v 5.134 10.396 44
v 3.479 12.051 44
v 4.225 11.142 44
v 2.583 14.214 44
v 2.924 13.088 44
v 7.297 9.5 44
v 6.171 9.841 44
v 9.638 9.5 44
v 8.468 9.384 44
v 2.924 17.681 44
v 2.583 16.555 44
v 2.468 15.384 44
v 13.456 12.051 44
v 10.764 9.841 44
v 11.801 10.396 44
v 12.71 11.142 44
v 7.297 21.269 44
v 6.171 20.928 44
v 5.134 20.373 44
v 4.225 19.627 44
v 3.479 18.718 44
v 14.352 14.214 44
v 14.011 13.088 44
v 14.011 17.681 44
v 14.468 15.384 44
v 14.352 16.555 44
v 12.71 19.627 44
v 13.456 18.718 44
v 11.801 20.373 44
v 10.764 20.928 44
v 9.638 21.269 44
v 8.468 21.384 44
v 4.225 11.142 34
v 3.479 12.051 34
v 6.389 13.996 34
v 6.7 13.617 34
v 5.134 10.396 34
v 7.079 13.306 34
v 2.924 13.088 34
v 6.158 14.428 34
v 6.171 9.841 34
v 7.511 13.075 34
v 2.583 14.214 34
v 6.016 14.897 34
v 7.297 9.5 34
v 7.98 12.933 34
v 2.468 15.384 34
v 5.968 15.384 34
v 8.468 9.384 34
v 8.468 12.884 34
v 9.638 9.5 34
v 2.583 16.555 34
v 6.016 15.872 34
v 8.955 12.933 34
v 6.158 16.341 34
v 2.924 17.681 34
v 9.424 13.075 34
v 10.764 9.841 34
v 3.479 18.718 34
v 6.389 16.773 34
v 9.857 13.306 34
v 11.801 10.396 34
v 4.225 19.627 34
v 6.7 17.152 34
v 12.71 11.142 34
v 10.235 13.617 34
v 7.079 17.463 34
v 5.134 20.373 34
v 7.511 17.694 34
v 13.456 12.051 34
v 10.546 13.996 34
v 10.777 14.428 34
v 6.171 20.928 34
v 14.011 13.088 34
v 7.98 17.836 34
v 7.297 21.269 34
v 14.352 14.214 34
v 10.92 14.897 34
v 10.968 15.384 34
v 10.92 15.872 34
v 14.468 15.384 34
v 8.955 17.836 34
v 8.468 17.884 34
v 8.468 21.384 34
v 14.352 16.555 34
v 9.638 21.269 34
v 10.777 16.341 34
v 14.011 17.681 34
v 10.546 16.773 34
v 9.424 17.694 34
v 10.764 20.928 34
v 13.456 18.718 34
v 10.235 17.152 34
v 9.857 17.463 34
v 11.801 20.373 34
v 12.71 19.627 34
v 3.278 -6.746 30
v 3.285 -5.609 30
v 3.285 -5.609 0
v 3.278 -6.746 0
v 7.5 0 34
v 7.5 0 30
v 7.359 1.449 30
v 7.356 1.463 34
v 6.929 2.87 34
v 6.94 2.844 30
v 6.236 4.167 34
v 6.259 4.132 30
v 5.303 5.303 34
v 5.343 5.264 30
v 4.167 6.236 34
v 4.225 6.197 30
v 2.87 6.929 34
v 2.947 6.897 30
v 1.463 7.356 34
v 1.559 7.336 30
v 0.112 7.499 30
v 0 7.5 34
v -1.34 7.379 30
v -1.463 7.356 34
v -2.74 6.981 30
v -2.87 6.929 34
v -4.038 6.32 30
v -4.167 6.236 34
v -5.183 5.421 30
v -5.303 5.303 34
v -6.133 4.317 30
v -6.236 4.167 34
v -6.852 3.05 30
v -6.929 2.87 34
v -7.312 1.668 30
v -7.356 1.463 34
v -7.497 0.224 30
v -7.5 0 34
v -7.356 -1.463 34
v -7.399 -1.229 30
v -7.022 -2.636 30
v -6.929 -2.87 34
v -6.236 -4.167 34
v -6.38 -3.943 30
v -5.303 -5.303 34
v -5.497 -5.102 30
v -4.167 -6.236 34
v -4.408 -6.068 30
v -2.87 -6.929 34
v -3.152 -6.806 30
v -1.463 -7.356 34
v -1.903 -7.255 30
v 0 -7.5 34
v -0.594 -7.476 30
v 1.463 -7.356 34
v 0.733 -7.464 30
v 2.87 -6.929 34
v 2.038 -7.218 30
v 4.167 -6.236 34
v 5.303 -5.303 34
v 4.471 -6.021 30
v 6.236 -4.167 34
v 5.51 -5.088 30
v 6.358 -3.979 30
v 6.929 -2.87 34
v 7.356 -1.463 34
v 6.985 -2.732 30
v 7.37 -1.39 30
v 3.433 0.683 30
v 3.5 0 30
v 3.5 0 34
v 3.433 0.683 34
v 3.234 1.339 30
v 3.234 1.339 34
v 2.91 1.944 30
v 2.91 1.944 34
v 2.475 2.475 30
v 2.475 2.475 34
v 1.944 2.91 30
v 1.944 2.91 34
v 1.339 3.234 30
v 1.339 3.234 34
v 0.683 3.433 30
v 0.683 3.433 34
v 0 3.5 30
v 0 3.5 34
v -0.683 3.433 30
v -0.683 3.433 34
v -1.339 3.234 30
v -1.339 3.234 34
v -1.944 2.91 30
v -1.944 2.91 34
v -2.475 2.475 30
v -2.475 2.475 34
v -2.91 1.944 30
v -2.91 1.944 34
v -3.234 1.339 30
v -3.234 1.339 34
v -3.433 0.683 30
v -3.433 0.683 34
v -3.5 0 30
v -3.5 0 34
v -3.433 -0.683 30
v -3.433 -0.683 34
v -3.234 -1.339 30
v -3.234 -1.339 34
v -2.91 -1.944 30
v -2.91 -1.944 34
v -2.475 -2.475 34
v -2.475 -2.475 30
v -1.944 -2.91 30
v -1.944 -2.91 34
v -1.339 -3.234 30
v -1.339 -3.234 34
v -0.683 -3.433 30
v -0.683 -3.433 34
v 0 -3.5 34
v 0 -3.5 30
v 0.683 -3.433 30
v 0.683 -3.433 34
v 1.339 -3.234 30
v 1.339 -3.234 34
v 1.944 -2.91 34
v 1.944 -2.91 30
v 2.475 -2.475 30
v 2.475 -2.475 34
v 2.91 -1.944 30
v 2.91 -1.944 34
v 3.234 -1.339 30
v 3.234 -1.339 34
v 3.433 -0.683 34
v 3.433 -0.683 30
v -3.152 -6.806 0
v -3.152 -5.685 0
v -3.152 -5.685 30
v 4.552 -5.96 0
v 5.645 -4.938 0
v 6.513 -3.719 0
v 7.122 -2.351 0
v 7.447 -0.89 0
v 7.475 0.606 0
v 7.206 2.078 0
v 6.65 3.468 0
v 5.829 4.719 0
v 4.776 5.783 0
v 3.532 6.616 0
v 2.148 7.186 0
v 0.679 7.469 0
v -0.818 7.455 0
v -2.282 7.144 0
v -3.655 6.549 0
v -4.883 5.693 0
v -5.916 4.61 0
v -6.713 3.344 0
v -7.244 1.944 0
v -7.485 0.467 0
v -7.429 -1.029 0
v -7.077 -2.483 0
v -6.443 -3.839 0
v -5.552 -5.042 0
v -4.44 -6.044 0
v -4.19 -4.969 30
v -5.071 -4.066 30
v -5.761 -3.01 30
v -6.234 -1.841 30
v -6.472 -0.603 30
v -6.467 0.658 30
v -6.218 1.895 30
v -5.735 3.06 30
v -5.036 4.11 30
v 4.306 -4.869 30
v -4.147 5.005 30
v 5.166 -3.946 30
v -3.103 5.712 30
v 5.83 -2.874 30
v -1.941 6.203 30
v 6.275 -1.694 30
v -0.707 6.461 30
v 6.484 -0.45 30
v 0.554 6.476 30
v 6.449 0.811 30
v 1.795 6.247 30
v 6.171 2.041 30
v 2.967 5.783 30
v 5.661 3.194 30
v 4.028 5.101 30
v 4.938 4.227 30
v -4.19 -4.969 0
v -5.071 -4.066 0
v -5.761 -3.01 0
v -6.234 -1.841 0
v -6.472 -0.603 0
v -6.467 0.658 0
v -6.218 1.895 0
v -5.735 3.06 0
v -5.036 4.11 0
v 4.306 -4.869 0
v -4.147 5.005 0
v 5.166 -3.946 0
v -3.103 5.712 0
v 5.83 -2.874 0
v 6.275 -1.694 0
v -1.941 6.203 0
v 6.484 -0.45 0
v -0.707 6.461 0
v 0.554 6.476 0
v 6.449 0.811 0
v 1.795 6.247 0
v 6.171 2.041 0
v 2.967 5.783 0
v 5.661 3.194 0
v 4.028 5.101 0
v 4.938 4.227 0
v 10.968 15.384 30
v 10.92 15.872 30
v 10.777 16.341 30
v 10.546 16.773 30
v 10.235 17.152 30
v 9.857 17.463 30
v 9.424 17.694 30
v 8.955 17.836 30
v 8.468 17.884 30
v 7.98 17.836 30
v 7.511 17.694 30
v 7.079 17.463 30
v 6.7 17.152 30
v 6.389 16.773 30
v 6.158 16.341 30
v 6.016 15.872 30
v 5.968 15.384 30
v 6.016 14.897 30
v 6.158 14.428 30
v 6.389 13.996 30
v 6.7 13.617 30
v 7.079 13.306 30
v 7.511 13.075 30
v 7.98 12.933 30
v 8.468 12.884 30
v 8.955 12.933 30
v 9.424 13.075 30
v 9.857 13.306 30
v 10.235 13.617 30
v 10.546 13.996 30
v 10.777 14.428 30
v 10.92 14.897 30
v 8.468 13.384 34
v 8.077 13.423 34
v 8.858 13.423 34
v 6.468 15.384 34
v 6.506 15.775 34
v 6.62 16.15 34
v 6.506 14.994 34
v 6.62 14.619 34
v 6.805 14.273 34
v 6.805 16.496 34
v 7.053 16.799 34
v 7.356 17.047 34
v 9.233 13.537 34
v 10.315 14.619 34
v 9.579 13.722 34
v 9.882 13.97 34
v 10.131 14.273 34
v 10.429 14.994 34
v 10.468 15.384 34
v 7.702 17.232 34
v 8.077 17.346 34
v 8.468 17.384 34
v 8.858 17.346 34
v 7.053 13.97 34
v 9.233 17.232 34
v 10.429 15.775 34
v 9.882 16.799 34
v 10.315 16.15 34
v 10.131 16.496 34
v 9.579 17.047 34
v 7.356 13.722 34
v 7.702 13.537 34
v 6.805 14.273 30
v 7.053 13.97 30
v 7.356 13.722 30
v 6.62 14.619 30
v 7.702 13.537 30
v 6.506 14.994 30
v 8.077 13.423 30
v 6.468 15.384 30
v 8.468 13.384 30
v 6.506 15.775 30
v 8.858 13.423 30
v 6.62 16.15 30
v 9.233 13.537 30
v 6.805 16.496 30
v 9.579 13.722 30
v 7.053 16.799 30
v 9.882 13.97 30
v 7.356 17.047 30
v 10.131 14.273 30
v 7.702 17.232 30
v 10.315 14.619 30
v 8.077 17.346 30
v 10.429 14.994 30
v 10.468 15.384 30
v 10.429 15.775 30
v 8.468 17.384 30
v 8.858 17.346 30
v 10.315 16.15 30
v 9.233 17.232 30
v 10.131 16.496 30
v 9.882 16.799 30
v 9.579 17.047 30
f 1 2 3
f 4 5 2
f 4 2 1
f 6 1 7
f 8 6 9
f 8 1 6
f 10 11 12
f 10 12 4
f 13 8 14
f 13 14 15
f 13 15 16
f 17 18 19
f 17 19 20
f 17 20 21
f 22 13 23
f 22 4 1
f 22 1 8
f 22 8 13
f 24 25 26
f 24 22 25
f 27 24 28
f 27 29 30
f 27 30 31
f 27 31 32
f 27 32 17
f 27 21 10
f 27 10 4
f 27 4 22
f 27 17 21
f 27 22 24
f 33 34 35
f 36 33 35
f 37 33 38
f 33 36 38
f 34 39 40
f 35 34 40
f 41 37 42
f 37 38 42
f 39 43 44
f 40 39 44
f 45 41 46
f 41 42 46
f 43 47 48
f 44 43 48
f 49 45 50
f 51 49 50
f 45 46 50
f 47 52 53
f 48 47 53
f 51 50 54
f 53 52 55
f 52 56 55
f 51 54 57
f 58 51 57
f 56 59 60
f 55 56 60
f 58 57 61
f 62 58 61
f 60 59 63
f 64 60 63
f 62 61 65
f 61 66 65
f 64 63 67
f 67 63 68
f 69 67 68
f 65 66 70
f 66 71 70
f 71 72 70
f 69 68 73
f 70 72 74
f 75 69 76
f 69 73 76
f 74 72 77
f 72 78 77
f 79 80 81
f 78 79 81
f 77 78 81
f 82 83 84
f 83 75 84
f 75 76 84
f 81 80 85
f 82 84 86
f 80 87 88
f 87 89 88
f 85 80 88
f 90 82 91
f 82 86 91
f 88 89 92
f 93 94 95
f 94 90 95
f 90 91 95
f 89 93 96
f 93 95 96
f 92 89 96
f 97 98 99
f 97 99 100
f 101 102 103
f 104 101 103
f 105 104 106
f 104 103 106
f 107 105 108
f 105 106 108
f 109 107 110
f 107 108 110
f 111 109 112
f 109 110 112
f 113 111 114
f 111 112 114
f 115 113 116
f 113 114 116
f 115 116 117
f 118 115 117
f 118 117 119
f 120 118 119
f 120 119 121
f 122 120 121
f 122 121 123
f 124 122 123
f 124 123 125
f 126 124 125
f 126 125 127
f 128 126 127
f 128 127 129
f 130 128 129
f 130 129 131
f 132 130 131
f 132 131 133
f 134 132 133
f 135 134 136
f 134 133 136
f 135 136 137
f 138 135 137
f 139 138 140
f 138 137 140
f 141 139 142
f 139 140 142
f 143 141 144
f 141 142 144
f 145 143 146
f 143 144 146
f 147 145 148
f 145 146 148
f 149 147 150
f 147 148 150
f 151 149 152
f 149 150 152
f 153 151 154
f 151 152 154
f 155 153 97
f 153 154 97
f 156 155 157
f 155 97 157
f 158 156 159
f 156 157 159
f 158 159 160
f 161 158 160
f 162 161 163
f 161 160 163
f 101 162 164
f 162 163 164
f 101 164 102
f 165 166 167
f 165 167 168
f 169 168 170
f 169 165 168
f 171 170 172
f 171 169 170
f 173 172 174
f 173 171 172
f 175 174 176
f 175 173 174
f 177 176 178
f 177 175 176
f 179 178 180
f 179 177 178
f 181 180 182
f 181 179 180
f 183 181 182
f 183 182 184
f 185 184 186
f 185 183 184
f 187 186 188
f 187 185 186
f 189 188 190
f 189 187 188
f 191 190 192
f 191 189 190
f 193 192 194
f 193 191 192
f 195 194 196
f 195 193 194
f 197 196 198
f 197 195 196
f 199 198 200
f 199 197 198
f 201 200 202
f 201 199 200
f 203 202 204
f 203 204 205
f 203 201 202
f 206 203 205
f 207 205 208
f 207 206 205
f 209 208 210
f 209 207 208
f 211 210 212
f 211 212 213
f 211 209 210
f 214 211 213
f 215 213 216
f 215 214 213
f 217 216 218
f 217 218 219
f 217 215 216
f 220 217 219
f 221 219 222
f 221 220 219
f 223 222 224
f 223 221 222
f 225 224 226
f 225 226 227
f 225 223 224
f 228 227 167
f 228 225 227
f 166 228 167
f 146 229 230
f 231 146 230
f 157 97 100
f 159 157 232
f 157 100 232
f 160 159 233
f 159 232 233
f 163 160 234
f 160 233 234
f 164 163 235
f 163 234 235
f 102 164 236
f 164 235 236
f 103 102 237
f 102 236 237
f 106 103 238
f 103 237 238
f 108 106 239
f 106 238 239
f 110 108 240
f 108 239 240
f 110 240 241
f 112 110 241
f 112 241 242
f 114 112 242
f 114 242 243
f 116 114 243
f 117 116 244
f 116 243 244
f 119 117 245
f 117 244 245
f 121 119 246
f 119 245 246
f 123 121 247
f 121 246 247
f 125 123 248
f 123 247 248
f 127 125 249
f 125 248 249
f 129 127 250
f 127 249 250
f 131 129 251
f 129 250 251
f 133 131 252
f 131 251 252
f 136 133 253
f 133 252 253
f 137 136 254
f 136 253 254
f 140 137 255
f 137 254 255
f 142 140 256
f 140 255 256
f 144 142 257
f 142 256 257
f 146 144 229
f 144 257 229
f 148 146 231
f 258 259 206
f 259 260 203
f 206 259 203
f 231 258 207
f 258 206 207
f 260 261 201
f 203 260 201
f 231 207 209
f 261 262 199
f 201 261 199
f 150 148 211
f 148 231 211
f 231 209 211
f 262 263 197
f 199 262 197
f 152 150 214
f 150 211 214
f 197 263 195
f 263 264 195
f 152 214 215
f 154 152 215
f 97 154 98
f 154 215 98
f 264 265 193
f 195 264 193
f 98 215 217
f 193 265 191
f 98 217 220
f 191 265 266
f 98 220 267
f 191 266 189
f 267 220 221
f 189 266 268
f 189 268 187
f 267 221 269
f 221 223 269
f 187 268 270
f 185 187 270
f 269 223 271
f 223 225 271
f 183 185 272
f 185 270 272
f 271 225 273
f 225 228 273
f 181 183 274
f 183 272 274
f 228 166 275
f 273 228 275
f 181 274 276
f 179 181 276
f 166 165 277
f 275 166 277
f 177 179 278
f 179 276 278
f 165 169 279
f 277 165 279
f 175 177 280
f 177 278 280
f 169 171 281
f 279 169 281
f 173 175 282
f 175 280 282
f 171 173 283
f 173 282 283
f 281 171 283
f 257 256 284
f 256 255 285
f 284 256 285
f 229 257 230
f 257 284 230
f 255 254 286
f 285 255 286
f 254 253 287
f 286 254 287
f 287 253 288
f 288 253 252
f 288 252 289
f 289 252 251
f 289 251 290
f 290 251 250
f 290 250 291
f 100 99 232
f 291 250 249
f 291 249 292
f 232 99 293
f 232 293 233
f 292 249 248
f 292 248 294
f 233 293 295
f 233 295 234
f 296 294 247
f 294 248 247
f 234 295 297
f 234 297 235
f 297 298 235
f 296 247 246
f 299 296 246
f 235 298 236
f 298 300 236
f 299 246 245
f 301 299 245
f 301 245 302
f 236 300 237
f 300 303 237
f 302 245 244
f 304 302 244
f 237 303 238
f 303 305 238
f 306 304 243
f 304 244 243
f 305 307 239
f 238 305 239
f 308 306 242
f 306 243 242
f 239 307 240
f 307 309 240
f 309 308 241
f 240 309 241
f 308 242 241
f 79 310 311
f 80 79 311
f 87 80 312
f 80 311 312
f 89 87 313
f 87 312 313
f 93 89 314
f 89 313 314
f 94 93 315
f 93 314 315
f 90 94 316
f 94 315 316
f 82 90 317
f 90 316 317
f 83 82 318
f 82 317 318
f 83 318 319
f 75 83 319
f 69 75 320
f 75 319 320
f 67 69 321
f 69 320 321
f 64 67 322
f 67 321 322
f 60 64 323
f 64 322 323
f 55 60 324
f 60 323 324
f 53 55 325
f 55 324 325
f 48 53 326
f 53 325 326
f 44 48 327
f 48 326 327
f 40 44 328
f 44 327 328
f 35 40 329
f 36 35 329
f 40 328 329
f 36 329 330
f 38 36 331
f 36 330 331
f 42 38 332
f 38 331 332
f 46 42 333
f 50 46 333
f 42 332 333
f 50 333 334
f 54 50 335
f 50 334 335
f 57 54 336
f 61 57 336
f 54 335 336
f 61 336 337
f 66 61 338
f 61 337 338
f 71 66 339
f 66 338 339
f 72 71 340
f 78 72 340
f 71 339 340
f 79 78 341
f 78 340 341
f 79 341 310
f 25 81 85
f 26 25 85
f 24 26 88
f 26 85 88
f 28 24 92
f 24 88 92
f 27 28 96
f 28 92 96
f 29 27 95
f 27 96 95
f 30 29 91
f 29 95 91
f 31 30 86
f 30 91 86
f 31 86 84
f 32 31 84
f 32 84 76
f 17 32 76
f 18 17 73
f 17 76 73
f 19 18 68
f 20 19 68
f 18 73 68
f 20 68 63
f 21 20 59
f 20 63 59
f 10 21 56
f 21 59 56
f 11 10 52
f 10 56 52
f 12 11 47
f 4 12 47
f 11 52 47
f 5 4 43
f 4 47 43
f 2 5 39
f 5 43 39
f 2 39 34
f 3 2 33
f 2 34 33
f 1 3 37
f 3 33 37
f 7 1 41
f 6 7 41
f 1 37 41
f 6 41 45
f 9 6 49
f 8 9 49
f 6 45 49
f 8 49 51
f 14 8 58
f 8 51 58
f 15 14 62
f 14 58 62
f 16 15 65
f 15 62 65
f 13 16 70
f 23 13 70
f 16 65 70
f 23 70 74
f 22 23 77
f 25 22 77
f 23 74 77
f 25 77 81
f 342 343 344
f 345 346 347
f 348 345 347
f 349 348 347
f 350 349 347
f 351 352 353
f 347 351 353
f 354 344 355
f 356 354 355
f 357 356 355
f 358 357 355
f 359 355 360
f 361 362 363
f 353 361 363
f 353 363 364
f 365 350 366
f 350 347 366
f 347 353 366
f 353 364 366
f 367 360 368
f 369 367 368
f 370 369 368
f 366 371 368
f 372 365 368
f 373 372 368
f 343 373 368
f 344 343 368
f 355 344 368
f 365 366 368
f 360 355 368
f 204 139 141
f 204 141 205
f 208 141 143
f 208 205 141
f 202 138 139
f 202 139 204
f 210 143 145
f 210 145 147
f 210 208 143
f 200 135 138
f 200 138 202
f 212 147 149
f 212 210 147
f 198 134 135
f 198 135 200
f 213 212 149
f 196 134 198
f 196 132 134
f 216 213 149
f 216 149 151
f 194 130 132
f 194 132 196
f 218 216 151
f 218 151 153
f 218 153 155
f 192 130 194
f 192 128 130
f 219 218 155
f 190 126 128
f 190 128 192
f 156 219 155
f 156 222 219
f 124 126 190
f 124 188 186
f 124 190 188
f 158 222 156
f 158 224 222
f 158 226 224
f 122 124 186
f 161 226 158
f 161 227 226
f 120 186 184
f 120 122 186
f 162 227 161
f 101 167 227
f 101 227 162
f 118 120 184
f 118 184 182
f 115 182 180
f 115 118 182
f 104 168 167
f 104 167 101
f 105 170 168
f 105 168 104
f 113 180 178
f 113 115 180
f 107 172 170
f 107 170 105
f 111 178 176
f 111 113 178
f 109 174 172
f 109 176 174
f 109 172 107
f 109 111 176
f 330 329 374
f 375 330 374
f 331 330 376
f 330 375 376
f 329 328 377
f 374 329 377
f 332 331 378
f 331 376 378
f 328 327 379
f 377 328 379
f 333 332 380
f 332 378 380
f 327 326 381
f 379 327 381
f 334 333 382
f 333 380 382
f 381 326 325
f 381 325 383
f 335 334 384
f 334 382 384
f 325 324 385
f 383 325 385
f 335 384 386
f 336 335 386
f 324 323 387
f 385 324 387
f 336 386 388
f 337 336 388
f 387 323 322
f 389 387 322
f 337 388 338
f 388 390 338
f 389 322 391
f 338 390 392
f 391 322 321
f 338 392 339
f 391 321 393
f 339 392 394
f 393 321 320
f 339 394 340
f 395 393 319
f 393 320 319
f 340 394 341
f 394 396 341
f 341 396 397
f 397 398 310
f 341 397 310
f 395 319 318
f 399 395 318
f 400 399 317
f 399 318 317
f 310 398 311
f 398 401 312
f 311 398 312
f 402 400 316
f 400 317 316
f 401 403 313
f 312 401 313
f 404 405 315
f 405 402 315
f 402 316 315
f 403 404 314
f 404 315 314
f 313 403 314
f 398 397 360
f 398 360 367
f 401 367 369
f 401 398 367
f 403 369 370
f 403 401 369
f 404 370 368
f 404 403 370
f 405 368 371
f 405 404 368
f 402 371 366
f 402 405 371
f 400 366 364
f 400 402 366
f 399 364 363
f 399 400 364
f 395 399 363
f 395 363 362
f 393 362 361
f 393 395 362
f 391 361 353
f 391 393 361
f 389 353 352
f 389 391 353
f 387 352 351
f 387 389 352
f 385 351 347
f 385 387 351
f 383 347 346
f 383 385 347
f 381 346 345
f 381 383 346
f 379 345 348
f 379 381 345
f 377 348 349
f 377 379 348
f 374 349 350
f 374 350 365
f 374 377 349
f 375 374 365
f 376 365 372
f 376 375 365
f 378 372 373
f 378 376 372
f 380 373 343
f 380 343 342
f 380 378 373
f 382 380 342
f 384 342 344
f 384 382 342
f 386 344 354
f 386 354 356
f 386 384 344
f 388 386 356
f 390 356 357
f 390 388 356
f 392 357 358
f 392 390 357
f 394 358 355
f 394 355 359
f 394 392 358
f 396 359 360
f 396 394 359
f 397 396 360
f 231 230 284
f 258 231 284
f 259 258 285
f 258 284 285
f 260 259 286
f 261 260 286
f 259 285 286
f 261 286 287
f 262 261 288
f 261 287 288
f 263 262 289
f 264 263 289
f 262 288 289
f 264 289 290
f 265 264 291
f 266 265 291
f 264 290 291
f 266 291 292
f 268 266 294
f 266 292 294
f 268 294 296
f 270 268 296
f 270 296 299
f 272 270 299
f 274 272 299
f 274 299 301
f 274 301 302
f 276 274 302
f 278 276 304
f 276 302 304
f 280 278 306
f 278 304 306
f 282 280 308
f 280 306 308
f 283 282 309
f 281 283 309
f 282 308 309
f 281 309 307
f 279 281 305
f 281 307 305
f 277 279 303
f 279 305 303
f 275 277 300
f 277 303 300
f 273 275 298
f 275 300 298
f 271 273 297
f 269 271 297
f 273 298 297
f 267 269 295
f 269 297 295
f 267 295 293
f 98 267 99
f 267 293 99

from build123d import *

# Parameters (mm, degrees)
F1_DEPTH = 30
F3_R     = 7.5
F3_R_2   = 3.5
F4_DEPTH = 4
F5_R     = 2.5
F5_R_2   = 2
F6_DEPTH = 4
F7_R     = 6
F8_DEPTH = 10


# Not quite as in the source:
# - a feature names something its author has since deleted; it is built from what else it names


with BuildPart() as f1:
    # F0 (on Top) → F1 (new body)
    with BuildSketch(Plane.XY):
        with BuildLine():
            Line((3.2850214823, -5.6087996809), (3.2781091996, -6.7456652804))
            ThreePointArc((3.2781091996, -6.7456652804), (-0.0698532595, 7.4996746944), (-3.1518908004, -6.8055554059))
            Line((-3.1518908004, -6.8055554059), (-3.1518908004, -5.684679796))
            ThreePointArc((-3.1518908004, -5.684679796), (-0.0766184872, 6.4995484157), (3.2850214823, -5.6087996809))
        make_face()
    extrude(amount=F1_DEPTH)

    # F3 (on offset) → F4 (join)
    with BuildSketch(Plane.XY.offset(30)):
        Circle(F3_R)
        Circle(F3_R_2, mode=Mode.SUBTRACT)
    extrude(amount=F4_DEPTH)


with BuildPart() as f6:
    # F5 (on offset) → F6 (new body)
    with BuildSketch(Plane.XY.offset(30)):
        with Locations((8.4675775911, 15.3844900672)):
            Circle(F5_R)
        with Locations((8.4675775911, 15.3844900672)):
            Circle(F5_R_2, mode=Mode.SUBTRACT)
    extrude(amount=F6_DEPTH)

    # F7 (on face) → F8 (join)
    with BuildSketch(Plane.XY.offset(34)):
        with Locations((8.4675775911, 15.3844900672)):
            Circle(F7_R)
    extrude(amount=F8_DEPTH)


solid = Compound([f1.part, f6.part])
